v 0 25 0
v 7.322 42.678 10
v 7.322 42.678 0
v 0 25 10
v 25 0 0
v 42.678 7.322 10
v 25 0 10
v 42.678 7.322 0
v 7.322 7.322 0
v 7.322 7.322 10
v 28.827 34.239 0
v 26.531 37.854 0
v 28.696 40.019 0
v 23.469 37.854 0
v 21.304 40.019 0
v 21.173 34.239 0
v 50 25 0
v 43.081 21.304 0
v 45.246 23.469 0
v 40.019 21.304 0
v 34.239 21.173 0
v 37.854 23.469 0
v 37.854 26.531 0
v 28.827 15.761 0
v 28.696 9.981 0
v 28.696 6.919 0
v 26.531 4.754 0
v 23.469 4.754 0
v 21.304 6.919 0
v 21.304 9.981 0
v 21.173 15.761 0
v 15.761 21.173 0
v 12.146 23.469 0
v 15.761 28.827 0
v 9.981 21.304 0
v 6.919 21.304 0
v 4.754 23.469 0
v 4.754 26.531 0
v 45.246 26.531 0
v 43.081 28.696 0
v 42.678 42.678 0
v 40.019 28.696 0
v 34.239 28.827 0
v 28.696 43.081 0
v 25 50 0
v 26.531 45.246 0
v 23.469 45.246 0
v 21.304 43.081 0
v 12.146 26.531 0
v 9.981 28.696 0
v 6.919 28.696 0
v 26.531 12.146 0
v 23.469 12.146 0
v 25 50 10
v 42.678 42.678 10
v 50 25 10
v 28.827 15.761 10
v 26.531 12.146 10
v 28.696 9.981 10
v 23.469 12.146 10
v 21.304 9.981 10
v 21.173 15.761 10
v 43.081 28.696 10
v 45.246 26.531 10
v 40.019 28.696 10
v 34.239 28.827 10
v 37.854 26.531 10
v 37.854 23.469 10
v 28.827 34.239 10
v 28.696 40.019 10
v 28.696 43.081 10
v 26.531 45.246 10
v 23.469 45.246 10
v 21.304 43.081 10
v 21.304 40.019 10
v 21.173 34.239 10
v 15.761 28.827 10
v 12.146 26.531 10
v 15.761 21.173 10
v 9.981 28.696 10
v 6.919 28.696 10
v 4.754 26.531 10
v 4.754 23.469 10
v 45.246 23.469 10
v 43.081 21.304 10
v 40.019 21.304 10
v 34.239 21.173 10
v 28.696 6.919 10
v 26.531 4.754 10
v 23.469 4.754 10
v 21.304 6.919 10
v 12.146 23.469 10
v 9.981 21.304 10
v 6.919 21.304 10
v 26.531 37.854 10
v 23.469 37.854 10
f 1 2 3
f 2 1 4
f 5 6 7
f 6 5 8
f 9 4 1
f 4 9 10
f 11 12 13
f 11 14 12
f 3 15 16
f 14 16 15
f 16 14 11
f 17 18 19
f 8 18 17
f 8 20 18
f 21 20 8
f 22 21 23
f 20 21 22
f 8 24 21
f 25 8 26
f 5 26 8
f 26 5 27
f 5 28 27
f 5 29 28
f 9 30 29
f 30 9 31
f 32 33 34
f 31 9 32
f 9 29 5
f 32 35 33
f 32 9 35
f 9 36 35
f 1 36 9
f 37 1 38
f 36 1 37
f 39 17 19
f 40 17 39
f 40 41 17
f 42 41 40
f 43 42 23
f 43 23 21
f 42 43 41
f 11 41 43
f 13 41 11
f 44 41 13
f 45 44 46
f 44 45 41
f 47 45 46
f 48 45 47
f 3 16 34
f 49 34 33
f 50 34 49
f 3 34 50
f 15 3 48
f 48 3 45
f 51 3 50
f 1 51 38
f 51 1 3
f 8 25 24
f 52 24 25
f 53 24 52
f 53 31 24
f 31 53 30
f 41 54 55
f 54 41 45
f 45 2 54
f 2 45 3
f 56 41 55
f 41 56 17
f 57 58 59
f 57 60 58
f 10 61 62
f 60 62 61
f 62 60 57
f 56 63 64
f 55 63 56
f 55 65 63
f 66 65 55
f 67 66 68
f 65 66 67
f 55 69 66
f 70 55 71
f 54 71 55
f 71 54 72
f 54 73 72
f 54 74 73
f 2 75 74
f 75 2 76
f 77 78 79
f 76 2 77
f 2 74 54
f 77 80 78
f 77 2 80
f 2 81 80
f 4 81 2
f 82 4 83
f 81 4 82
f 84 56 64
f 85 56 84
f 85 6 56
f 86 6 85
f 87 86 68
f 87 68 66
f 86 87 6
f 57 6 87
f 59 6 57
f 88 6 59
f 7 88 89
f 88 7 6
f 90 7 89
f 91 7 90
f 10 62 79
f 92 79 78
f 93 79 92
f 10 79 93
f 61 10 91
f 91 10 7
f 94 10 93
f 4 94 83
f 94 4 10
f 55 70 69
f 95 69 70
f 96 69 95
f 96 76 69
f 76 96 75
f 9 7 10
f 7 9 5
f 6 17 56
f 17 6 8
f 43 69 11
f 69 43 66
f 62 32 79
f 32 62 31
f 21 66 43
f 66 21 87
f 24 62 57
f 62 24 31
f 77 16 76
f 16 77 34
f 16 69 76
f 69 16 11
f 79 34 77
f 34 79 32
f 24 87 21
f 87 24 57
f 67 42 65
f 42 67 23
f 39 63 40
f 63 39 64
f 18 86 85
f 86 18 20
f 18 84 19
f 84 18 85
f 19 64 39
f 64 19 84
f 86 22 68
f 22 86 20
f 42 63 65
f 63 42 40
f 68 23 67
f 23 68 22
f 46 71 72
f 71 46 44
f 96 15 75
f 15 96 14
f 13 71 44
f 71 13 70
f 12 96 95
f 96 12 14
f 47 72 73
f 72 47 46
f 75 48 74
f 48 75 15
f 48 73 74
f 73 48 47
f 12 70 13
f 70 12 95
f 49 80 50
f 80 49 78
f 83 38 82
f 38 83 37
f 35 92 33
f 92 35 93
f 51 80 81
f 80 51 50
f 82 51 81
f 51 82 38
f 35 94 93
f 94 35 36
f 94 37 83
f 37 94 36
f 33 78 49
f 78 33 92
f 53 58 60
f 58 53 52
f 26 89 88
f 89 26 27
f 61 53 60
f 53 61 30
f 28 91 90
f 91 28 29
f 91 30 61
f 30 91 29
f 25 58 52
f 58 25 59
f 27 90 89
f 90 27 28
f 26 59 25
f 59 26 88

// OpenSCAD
$fn = 32;

// ----------------------------------------------------------------------
// Polygon plate: 8-gon R25, 4 bolt windows
// ----------------------------------------------------------------------

// --- parameters (mm) ---
sides = 8;                // number of polygon sides
plate_r = 25;             // circumscribed radius of the polygon
bore_r = 10;              // centre bore radius
bolts = 4;                // number of bolt windows
ring_r = 16.55;           // bolt-circle radius
bolt_r = 4;               // bolt window radius
plate_t = 10;             // plate thickness, Z (extrusion height)
fit_tol = 0.1;            // declared fit tolerance (prompt contract)
free_tol = 0.5;           // declared free tolerance (prompt contract)

plate_d = 2 * plate_r;  // circumscribed diameter
bore_d = 2 * bore_r;  // centre bore diameter
bolt_d = 2 * bolt_r;  // bolt window diameter
ring_d = 2 * ring_r;  // bolt-circle diameter

profile = [[50, 25], [42.678, 42.678], [25, 50], [7.322, 42.678], [0, 25], [7.322, 7.322], [25, 0], [42.678, 7.322]];  // primary outline, 8 points, counter clockwise
void_1 = [[34.239, 28.827], [28.827, 34.239], [21.173, 34.239], [15.761, 28.827], [15.761, 21.173], [21.173, 15.761], [28.827, 15.761], [34.239, 21.173]];  // centre bore, 8 points
void_2 = [[45.246, 26.531], [43.081, 28.696], [40.019, 28.696], [37.854, 26.531], [37.854, 23.469], [40.019, 21.304], [43.081, 21.304], [45.246, 23.469]];  // bolt window 1, 8 points
void_3 = [[28.696, 43.081], [26.531, 45.246], [23.469, 45.246], [21.304, 43.081], [21.304, 40.019], [23.469, 37.854], [26.531, 37.854], [28.696, 40.019]];  // bolt window 2, 8 points
void_4 = [[12.146, 26.531], [9.981, 28.696], [6.919, 28.696], [4.754, 26.531], [4.754, 23.469], [6.919, 21.304], [9.981, 21.304], [12.146, 23.469]];  // bolt window 3, 8 points
void_5 = [[28.696, 9.981], [26.531, 12.146], [23.469, 12.146], [21.304, 9.981], [21.304, 6.919], [23.469, 4.754], [26.531, 4.754], [28.696, 6.919]];  // bolt window 4, 8 points

// --- the one profile operation ---
difference() {
  linear_extrude(height = plate_t) polygon(points = profile);
  translate([0, 0, -1])
    linear_extrude(height = plate_t + 2) polygon(points = void_1);
  translate([0, 0, -1])
    linear_extrude(height = plate_t + 2) polygon(points = void_2);
  translate([0, 0, -1])
    linear_extrude(height = plate_t + 2) polygon(points = void_3);
  translate([0, 0, -1])
    linear_extrude(height = plate_t + 2) polygon(points = void_4);
  translate([0, 0, -1])
    linear_extrude(height = plate_t + 2) polygon(points = void_5);
}
